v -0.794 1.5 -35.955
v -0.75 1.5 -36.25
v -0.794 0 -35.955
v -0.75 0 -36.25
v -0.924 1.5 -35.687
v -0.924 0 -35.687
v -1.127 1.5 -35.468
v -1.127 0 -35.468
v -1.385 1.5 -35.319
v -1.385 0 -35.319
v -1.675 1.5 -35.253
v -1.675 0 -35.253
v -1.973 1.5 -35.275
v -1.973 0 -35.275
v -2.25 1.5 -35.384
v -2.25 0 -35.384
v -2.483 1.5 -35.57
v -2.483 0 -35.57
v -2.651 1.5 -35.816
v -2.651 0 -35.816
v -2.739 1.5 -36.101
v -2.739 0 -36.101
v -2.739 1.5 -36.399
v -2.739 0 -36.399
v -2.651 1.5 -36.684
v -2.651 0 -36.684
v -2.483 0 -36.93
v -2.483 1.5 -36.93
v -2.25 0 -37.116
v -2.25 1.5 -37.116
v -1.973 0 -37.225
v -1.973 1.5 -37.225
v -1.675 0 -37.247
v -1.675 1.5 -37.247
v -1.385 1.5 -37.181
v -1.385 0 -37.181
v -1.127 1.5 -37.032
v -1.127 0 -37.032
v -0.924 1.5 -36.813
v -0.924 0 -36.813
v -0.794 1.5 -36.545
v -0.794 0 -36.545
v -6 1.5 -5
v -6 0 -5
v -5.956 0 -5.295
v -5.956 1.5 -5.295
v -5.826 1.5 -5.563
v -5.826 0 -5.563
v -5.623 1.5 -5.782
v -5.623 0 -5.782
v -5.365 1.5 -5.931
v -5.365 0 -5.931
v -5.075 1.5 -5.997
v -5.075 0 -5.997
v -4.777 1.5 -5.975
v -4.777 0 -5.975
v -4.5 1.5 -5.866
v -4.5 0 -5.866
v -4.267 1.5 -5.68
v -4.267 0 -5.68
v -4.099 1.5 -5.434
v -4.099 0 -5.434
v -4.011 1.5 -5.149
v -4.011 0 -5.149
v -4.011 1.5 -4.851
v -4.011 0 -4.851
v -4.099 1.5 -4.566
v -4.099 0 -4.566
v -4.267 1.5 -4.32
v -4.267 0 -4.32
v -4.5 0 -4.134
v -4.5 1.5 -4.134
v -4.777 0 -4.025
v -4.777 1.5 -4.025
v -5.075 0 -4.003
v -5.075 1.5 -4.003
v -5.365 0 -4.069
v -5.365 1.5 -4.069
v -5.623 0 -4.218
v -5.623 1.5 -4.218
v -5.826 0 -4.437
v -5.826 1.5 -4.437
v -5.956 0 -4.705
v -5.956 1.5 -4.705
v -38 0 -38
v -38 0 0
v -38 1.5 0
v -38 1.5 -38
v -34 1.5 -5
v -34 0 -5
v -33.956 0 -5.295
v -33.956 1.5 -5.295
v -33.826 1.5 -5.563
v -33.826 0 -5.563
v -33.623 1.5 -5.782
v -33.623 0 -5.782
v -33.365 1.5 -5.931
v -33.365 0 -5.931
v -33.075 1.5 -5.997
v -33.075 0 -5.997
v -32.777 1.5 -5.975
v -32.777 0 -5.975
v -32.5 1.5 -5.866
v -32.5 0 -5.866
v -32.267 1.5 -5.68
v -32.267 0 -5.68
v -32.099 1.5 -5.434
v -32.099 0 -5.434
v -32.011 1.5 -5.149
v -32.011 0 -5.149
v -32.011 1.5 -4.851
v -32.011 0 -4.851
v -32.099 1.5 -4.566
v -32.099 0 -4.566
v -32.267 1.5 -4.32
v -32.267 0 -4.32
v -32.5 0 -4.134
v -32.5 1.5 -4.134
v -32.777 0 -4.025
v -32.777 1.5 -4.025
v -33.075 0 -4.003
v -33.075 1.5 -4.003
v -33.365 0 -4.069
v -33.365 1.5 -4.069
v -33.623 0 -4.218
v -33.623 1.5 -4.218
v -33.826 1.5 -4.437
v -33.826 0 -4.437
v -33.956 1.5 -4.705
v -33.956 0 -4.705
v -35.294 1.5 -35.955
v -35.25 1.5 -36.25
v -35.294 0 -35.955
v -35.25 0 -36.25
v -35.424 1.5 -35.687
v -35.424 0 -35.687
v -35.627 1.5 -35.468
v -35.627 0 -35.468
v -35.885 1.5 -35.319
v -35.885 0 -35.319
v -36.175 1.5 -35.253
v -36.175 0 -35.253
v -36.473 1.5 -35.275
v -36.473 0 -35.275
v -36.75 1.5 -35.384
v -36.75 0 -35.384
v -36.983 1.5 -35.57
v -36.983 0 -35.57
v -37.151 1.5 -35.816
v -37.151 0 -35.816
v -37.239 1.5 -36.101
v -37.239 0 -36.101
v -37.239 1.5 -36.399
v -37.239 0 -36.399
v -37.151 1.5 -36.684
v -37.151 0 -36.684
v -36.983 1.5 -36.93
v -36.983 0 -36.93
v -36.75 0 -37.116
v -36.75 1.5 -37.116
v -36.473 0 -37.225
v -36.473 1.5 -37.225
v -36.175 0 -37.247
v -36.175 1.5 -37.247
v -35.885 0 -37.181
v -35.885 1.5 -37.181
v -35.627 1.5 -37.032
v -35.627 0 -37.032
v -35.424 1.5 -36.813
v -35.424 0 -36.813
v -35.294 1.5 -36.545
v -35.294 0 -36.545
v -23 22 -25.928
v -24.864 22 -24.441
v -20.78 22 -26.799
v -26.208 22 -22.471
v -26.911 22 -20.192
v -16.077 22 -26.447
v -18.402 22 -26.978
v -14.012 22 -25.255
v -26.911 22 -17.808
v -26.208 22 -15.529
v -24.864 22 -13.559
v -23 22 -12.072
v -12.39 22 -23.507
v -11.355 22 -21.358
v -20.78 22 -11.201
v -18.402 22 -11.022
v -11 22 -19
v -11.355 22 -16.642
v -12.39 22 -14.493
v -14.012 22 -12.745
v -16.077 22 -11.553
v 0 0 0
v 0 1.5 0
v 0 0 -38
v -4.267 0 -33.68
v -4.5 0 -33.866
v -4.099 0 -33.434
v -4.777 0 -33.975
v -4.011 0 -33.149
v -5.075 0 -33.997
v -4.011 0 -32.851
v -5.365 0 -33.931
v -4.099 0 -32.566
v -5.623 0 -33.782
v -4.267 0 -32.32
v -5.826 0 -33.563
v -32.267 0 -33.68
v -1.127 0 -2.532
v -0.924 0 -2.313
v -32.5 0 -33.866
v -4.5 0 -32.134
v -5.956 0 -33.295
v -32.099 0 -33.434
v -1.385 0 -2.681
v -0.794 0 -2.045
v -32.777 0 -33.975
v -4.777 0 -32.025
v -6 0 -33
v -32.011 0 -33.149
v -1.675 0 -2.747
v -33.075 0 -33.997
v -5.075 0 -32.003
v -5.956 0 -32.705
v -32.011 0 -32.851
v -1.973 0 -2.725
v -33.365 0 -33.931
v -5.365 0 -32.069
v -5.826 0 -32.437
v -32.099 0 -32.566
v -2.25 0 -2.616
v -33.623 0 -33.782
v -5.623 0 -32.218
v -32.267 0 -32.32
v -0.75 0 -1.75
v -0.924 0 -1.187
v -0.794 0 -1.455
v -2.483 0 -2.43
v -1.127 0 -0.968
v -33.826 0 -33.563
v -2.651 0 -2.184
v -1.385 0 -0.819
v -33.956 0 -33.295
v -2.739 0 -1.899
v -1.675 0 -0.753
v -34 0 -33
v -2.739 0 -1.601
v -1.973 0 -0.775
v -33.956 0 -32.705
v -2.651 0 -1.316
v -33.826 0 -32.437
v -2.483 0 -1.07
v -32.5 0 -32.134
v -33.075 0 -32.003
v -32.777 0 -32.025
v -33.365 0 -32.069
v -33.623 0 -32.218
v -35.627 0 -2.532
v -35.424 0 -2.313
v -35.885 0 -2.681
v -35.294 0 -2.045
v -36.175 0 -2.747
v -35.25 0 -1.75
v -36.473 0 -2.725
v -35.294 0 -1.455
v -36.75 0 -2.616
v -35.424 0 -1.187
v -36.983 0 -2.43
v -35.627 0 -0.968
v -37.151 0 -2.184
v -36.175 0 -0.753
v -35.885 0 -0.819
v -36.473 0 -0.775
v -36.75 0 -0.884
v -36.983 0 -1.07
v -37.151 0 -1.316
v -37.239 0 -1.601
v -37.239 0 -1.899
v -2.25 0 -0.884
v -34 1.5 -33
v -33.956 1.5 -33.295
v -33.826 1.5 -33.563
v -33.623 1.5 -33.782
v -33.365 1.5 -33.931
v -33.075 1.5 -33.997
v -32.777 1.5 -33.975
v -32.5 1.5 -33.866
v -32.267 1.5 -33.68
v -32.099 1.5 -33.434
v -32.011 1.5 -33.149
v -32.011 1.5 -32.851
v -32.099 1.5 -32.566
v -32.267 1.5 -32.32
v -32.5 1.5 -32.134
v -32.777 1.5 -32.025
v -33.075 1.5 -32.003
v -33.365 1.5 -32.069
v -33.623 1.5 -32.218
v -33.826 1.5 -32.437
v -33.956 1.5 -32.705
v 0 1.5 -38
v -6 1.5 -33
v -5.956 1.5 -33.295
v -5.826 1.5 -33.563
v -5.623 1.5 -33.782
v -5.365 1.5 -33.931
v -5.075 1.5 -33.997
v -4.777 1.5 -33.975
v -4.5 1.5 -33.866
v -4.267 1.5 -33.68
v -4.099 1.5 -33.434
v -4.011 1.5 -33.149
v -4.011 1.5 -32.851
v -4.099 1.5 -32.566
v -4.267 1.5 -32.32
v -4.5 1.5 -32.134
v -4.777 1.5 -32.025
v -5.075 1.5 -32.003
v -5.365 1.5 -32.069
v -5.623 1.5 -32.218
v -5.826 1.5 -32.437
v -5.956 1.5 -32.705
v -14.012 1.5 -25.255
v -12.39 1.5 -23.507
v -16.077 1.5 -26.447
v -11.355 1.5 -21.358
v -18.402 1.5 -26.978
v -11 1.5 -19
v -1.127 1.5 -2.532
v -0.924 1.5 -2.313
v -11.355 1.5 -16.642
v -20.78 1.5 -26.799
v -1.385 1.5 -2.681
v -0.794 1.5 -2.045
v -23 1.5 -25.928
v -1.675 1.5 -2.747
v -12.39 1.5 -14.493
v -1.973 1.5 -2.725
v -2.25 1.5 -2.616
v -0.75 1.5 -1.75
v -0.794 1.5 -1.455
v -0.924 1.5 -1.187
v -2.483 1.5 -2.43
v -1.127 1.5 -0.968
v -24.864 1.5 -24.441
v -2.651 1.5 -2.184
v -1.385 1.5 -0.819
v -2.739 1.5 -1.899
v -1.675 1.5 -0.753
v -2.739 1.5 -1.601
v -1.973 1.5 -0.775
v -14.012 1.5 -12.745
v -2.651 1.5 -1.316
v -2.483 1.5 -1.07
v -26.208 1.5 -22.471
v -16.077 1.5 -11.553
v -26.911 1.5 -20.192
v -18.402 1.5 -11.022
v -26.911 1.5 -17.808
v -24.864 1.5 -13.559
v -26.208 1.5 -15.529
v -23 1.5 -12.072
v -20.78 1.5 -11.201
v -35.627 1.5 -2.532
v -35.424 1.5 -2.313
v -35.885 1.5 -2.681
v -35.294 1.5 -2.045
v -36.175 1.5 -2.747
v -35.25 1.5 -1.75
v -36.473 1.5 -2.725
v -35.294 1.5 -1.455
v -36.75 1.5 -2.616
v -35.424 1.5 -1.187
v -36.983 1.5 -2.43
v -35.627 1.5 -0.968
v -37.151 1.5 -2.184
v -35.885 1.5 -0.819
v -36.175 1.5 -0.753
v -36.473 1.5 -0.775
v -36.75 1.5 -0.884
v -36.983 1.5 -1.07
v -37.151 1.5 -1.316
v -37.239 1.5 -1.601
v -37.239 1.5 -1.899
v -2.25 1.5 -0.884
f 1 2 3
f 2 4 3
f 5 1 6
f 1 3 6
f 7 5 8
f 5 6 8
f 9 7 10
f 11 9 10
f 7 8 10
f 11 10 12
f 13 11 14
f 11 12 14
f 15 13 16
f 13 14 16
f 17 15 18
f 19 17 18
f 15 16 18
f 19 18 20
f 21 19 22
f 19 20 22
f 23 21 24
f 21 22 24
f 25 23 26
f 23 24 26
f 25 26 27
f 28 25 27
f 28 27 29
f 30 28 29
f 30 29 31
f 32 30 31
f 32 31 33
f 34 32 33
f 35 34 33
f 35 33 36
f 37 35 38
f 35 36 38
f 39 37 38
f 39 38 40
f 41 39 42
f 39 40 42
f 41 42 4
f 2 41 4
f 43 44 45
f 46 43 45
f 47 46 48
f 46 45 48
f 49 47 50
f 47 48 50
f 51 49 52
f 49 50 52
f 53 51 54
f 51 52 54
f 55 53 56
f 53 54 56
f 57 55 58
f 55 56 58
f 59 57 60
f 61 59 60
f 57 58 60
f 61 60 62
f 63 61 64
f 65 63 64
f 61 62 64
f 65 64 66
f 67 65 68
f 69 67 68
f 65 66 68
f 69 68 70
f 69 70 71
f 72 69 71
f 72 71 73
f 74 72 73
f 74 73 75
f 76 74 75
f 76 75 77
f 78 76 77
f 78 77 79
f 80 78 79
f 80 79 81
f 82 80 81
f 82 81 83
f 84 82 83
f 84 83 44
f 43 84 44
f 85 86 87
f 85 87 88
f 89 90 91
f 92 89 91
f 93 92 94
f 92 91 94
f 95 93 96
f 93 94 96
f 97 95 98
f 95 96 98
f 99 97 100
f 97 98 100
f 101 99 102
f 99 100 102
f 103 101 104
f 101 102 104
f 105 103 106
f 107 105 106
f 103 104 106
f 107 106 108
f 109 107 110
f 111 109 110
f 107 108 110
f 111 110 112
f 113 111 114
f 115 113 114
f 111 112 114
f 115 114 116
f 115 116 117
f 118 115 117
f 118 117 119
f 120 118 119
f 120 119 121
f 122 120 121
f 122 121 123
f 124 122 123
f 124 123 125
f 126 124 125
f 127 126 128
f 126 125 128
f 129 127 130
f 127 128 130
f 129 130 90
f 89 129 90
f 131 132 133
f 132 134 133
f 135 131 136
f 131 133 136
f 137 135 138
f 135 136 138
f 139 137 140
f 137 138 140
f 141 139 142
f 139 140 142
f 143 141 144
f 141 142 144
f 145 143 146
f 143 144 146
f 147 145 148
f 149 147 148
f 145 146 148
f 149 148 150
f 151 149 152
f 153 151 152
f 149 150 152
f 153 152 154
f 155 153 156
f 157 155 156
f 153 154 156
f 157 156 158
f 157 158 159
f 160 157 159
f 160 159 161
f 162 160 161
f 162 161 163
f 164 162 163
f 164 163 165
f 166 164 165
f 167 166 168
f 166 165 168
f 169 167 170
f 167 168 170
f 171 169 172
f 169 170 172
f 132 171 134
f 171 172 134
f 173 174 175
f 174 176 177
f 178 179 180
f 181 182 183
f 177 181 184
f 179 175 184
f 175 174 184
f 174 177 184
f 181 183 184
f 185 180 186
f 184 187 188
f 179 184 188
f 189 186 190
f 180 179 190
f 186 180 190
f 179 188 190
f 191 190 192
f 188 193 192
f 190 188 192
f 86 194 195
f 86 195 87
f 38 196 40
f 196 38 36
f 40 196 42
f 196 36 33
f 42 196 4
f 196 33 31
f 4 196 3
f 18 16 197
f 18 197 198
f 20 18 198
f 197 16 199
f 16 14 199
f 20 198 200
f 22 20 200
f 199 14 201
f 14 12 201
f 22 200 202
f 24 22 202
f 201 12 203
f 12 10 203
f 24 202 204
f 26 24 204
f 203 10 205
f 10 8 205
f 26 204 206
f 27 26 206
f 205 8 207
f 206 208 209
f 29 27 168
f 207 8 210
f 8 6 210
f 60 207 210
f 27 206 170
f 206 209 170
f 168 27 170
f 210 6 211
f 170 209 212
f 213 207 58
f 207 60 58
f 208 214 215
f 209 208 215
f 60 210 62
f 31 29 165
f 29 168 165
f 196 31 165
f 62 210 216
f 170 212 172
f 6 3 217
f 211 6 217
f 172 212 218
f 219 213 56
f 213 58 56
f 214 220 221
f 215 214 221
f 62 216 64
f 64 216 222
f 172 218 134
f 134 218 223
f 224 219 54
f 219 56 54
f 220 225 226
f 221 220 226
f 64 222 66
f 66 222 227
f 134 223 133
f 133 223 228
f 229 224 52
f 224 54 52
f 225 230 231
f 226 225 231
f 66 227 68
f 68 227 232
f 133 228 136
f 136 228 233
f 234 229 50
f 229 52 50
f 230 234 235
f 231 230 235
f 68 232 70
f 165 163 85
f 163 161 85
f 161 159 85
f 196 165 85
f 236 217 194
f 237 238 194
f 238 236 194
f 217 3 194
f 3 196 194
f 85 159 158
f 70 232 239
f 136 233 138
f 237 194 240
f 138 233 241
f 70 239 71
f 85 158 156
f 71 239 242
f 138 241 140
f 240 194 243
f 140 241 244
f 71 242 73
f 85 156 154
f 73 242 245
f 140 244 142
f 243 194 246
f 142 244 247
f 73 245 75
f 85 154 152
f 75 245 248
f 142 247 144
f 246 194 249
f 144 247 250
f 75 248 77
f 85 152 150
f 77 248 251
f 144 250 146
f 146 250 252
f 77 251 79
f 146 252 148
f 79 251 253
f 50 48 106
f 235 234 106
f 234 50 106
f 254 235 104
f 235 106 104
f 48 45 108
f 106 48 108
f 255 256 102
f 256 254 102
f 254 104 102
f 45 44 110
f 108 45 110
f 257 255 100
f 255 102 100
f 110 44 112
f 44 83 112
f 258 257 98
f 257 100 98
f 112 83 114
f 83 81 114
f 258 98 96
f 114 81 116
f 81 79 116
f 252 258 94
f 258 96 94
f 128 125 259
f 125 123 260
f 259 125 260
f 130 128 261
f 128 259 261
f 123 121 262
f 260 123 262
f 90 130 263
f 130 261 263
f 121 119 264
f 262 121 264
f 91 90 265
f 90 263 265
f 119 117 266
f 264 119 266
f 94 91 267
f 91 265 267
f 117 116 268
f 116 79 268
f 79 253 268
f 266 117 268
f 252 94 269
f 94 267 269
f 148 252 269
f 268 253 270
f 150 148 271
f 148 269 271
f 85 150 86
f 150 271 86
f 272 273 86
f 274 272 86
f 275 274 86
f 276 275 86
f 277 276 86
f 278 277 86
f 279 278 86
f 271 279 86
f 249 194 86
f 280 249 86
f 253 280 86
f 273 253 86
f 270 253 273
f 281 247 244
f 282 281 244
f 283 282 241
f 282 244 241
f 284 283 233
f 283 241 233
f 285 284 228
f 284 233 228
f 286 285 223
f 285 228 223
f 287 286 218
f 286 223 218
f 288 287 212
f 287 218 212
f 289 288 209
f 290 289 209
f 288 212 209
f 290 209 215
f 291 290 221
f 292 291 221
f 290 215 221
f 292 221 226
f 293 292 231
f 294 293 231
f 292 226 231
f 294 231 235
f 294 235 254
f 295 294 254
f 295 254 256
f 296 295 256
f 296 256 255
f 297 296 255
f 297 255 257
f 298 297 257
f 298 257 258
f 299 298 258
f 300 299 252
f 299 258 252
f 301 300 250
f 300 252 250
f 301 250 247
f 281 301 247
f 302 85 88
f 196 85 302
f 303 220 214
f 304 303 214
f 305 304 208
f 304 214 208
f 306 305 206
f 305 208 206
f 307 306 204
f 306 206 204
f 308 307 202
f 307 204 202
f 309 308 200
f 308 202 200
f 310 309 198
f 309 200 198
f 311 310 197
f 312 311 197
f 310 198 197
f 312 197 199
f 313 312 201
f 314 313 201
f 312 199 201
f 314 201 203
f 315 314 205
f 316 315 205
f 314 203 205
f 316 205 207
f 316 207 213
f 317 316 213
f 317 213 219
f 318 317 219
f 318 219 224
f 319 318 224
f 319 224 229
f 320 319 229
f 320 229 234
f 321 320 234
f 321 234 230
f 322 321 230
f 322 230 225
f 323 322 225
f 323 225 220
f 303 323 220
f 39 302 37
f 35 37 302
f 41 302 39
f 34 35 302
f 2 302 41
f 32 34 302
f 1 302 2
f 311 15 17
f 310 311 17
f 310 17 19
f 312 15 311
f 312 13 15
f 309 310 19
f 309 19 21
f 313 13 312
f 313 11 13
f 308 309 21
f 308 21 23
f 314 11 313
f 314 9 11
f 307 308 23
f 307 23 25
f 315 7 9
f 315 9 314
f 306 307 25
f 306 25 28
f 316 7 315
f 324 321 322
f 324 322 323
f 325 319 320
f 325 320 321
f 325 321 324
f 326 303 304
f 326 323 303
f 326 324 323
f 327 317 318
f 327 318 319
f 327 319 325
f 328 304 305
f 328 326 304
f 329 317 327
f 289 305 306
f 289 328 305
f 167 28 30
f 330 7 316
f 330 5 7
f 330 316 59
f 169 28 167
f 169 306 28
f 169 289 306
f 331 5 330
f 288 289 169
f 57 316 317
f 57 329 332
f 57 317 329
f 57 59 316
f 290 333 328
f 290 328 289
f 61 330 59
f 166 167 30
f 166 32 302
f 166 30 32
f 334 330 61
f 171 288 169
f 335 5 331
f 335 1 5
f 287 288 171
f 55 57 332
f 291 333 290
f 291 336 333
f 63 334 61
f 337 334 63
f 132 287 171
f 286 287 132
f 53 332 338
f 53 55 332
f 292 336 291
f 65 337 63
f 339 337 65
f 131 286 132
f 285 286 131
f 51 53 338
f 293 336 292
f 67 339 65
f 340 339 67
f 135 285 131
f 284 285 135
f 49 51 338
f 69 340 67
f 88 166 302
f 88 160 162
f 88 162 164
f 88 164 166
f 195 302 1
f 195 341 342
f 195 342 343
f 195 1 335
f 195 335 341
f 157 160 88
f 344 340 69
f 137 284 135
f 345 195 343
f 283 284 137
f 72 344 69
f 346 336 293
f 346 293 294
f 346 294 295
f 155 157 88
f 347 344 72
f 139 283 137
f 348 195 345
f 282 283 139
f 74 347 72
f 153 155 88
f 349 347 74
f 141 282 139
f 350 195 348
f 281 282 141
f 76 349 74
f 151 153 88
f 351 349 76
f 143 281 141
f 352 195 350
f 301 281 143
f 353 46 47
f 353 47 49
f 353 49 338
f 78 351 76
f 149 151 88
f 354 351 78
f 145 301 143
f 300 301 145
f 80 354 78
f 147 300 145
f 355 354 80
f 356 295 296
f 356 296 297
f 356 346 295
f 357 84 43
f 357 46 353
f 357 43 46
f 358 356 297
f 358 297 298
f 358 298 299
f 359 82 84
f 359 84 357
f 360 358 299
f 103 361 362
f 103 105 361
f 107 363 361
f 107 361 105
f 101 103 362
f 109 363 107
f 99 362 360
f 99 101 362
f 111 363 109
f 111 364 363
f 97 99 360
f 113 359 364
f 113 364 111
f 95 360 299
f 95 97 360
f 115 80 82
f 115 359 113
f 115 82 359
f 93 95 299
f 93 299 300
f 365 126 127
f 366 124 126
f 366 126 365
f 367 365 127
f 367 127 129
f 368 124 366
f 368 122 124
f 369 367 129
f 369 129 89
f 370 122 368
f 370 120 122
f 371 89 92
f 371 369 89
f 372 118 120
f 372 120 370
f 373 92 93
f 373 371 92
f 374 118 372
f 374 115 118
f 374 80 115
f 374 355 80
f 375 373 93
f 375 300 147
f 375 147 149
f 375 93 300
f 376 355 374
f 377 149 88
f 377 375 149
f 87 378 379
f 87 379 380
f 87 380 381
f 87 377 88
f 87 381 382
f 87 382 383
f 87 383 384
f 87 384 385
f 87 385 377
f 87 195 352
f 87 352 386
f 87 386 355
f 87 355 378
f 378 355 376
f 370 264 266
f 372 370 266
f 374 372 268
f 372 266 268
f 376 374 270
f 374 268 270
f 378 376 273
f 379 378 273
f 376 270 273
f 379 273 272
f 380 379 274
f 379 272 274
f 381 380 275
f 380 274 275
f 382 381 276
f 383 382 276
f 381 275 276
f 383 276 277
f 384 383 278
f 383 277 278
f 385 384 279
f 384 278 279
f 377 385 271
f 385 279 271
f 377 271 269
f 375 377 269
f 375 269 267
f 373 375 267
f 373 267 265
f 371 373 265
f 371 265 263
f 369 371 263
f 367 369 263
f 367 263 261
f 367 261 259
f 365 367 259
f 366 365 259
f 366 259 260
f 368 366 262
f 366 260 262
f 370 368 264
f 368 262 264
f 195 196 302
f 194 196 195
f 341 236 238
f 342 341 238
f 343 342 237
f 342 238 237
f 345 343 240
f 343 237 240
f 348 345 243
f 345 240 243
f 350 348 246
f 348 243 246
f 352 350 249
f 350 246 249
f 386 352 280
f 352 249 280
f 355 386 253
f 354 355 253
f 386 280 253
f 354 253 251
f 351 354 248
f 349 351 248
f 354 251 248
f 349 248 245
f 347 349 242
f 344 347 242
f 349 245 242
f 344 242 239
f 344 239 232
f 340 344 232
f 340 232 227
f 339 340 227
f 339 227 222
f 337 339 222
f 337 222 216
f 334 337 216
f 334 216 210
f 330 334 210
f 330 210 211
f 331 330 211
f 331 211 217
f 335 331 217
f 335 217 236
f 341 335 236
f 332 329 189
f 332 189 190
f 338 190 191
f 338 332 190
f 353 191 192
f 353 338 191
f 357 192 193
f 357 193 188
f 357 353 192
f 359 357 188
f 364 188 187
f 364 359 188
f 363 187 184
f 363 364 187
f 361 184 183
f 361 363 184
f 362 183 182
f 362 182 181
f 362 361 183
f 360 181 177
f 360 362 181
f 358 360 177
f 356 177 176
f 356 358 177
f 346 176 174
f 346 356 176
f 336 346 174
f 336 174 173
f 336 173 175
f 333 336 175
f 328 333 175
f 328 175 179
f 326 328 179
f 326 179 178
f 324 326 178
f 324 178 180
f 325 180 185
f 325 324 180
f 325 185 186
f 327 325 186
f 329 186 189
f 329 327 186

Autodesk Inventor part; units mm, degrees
ref_plane "YZ Plane" through (0, 0, 0) normal (1, 0, 0) x (0, 1, 0)
ref_plane "XZ Plane" through (0, 0, 0) normal (0, 1, 0) x (-1, 0, 0)
ref_plane "XY Plane" through (0, 0, 0) normal (0, 0, 1) x (1, 0, 0)
sketch "Sketch1" plane through (0, 0, 0) normal (0, 1, 0) x (-1, 0, 0)
  line L0 (0, 0) -> (38, 0)
  line L1 (38, 0) -> (38, -38)
  line L2 (38, -38) -> (0, -38)
  line L3 (0, -38) -> (0, 0)
  line L4 (19, 0) -> (19, -38)
  line L5 (38, -19) -> (0, -19)
  circle A0 centre (19, -19) radius 8
  line L6 (0, -19) -> (0, -5)
  line L7 (38, -19) -> (38, -5)
  line L8 (38, -19) -> (38, -33)
  line L9 (0, -19) -> (0, -33)
  line L10 (0, -33) -> (38, -33)
  line L11 (38, -5) -> (0, -5)
  line L12 (19, -5) -> (5, -5)
  line L13 (19, -33) -> (33, -33)
  line L14 (33, -33) -> (33, -5)
  line L15 (5, -5) -> (5, -33)
  circle A1 centre (5, -5) radius 1
  circle A2 centre (5, -33) radius 1
  circle A3 centre (33, -33) radius 1
  circle A4 centre (33, -5) radius 1
  dimension "d0" = 38
  dimension "d1" = 38
  dimension "d2" = 16
  dimension "d3" = 14
  dimension "d4" = 14
  dimension "d5" = 14
  dimension "d6" = 14
  dimension "d7" = 14
  dimension "d8" = 14
  dimension "d9" = 28
  dimension "d10" = 28
  dimension "d11" = 2
  dimension "d12" = 2
  dimension "d13" = 2
  dimension "d14" = 2
extrude "Extrusion1" add sketch "Sketch1" along normal blind 1.5 contours L0 L4 L11 A1 L3 | L0 L1 L11 A4 L4 | L11 A1 L15 L5 L3 | L11 A4 L14 L5 A0 L4 | L4 A0 L5 L15 A1 L11 | L5 L15 A2 L10 L3 | L1 L5 L14 A4 L11 | L10 A2 L4 L2 L3 | L5 A0 L4 L10 A2 L15 | L1 L10 A3 L14 L5 | L5 L14 A3 L10 L4 A0 | L1 L2 L4 L10 A3
sketch "Sketch2" plane through (0, 0, 0) normal (0, -1, 0) x (1, 0, 0)
  circle A0 centre (-19, -19) radius 8 projected
  circle A1 centre (-19, -19) radius 8
  point P0 (0, 0)
extrude "Extrusion2" add sketch "Sketch2" against normal blind 22
sketch "Sketch4" plane through (0, 0, 0) normal (0, -1, 0) x (1, 0, 0)
  line L0 (0, 0) -> (0, -38) projected
  line L1 (0, -19) -> (-38, -19)
  line L2 (-38, -38) -> (-38, 0) projected
  line L3 (0, -38) -> (-38, -38) projected
  line L4 (-19, -38) -> (-19, 0)
  line L5 (-19, -19) -> (-19, -1.75)
  line L6 (-19, -1.75) -> (-1.75, -1.75)
  line L7 (-19, -19) -> (-36.25, -19)
  line L8 (-36.25, -19) -> (-36.25, -36.25)
  circle A0 centre (-1.75, -1.75) radius 1
  circle A1 centre (-36.25, -36.25) radius 1
  circle A2 centre (-1.75, -36.25) radius 1
  circle A3 centre (-36.25, -1.75) radius 1
  dimension "d24" = 17.25
  dimension "d25" = 17.25
  dimension "d26" = 17.25
  dimension "d27" = 17.25
  dimension "d28" = 2
  dimension "d29" = 2
extrude "Extrusion4" cut sketch "Sketch4" against normal blind 10 contours A0 | A1 | A2 | A3
properties part number "camera_v1"
